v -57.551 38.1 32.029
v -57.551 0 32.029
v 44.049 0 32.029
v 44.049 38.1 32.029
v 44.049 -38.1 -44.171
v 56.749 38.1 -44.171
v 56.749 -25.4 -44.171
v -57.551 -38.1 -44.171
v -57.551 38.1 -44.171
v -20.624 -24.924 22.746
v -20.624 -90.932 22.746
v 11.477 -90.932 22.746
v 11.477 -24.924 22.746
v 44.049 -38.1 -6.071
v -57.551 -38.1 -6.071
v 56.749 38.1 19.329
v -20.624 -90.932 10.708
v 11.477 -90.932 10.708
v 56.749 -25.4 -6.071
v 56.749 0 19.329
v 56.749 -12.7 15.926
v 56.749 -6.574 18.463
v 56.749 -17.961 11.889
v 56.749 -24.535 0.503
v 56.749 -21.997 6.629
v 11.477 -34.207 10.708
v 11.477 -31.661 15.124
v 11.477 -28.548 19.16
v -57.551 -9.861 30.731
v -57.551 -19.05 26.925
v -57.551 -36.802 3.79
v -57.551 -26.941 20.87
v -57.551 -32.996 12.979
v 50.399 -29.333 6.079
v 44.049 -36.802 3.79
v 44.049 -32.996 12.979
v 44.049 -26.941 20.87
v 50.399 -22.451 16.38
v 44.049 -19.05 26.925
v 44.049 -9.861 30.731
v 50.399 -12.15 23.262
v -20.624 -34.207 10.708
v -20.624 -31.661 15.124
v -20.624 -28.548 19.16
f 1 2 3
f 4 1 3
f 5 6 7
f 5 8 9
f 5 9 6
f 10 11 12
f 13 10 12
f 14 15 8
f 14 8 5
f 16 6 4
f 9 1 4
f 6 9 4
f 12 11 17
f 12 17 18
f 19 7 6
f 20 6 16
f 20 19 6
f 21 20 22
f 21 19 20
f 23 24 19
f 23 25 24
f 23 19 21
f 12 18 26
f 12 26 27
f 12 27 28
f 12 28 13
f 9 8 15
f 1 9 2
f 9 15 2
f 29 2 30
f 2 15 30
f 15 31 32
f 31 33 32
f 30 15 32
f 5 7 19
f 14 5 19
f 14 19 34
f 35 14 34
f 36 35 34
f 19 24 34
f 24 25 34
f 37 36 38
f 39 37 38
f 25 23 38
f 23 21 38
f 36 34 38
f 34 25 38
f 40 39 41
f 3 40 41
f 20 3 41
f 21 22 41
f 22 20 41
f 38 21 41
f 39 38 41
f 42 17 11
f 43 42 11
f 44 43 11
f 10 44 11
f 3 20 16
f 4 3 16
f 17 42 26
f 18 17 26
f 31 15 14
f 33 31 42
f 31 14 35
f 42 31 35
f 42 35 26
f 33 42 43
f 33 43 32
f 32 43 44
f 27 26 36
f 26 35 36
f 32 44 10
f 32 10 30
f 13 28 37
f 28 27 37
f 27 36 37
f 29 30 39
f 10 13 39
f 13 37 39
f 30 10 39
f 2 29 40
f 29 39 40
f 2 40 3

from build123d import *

# Parameters (mm, degrees)
F0_W     = 114.3
F0_H     = 76.2
F1_DEPTH = 38.1
F2_R     = 38.1
F3_SIZE  = 12.7
F4_W     = 32.1010919288
F4_H     = 12.0379095897
F5_DEPTH = 90.932


with BuildPart() as f1:
    # F0 (on Front) → F1 (new body, symmetric)
    with BuildSketch(Plane.XZ):
        with Locations((-0.4010554403, -6.0710595265)):
            Rectangle(F0_W, F0_H)
    extrude(amount=F1_DEPTH, both=True)

    # F2
    f2_edges = [f1.edges().sort_by_distance(p)[0] for p in [
        (-0.401055, -38.1, 32.02894),
    ]]
    fillet(f2_edges, radius=F2_R)

    # F3
    f3_edges = [f1.edges().sort_by_distance(p)[0] for p in [
        (56.748945, 19.05, 32.02894),
    ]]
    chamfer(f3_edges, length=F3_SIZE)

    # F4 (on Front) → F5 (join)
    with BuildSketch(Plane.XZ):
        with Locations((-4.5737079345, 16.7265743949)):
            Rectangle(F4_W, F4_H)
    extrude(amount=F5_DEPTH)


solid = f1.part
